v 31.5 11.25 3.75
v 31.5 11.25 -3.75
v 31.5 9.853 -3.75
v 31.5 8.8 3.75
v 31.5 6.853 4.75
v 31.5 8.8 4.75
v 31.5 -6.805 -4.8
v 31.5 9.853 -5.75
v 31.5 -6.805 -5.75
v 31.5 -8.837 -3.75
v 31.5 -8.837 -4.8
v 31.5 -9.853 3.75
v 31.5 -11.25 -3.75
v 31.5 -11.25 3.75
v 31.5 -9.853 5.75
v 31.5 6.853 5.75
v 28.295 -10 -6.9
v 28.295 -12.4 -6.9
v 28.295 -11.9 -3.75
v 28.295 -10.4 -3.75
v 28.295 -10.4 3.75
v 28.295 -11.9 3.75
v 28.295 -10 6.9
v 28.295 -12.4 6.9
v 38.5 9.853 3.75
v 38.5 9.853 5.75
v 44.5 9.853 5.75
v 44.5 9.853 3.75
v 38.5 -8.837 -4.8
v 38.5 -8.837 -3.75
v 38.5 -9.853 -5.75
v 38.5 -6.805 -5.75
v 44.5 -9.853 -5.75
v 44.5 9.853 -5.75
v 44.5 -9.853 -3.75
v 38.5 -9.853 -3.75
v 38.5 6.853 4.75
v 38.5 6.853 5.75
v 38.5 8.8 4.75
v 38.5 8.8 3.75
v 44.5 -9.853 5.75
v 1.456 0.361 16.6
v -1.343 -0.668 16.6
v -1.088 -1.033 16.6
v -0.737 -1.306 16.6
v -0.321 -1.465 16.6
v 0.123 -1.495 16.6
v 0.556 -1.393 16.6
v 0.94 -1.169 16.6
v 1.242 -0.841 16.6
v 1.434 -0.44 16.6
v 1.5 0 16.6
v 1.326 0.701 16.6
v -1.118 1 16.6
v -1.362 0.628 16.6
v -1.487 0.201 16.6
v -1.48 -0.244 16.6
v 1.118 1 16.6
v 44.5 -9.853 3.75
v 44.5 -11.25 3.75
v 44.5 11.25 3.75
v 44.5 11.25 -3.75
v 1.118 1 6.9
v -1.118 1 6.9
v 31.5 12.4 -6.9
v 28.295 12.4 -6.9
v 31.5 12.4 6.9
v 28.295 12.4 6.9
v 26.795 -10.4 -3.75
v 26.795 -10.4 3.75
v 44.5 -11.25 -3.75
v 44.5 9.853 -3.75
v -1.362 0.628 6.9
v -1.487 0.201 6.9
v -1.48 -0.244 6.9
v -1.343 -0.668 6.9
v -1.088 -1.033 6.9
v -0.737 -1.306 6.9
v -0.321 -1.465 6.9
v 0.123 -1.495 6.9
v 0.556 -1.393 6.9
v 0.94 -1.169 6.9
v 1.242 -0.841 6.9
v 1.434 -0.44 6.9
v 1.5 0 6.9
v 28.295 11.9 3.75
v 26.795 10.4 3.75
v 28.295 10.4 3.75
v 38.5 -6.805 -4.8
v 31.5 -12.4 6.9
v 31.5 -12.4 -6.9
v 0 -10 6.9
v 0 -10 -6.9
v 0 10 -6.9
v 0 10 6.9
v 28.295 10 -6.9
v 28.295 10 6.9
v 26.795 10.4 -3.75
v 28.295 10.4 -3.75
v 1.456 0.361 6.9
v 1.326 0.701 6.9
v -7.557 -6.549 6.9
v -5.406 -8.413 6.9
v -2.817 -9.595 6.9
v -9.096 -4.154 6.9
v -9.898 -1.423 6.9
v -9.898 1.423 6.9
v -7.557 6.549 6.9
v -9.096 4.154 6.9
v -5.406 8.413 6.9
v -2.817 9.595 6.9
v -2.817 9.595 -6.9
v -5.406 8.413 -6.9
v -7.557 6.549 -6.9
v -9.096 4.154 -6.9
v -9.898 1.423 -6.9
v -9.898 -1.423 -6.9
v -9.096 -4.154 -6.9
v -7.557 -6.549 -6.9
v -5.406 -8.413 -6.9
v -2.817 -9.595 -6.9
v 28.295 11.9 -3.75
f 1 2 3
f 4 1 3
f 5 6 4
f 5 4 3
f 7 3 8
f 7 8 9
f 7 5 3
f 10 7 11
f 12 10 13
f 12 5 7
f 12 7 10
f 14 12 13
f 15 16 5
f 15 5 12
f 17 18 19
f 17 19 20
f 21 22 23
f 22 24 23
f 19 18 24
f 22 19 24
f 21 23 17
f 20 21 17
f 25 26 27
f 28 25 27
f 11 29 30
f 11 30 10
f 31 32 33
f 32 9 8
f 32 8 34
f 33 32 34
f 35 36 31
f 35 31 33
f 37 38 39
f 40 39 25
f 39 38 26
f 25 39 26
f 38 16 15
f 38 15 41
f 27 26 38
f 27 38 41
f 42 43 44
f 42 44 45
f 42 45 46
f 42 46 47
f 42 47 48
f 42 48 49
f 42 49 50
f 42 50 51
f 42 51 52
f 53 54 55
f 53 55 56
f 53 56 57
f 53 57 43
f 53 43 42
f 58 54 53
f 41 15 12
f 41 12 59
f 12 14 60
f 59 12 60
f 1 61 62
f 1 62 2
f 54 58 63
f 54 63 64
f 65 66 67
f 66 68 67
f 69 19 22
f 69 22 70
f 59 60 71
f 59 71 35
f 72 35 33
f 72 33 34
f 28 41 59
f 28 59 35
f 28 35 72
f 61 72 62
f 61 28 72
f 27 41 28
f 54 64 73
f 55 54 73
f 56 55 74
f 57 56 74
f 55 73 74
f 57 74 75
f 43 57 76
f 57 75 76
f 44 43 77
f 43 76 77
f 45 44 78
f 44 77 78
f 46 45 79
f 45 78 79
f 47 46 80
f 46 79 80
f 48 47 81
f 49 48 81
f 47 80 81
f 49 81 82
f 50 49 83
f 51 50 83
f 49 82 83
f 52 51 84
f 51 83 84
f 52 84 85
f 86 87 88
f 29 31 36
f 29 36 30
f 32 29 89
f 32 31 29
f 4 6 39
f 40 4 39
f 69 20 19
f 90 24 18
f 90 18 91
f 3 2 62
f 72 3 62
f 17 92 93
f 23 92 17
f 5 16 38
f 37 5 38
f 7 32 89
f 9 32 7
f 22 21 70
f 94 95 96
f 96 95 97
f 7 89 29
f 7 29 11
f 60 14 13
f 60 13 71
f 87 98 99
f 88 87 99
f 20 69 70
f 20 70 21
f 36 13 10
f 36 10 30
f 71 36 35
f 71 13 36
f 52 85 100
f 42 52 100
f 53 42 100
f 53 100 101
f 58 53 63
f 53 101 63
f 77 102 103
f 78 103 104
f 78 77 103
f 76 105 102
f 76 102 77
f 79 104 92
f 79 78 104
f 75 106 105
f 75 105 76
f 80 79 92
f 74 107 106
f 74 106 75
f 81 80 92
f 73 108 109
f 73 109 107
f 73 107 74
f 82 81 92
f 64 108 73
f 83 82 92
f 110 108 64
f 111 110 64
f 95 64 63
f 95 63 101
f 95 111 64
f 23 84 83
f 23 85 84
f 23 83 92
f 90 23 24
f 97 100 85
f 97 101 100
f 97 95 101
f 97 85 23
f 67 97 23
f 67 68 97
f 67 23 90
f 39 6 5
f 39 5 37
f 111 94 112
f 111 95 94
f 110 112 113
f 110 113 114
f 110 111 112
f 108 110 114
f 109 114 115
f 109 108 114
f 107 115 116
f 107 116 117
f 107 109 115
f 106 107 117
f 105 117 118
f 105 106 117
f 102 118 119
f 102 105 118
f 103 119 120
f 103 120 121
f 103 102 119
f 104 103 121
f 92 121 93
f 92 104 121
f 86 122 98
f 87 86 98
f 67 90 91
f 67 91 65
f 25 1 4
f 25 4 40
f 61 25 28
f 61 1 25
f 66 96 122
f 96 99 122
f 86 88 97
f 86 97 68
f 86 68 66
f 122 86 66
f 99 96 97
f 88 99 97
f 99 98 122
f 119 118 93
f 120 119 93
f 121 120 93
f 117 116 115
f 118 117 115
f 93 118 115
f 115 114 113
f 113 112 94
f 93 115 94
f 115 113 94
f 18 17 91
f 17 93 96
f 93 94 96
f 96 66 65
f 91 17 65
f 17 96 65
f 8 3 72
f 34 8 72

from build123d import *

# Parameters (mm, degrees)
SKETCH1_R           = 10
SKETCH1_W           = 31.5
SKETCH1_H           = 20
SKETCH1_W_2         = 3.204542896
SKETCH1_H_2         = 24.8
BOSS_EXTRUDE1_DEPTH = 6.9
BOSS_EXTRUDE2_DEPTH = 5.75
BOSS_EXTRUDE3_DEPTH = 9.7
SKETCH3_W           = 13
SKETCH3_H           = 1.999999936
SKETCH3_H_2         = 2.000000064
CUT_EXTRUDE1_DEPTH  = 1.397
SKETCH4_W           = 7.0000114
SKETCH4_H           = 1.016
CUT_EXTRUDE2_DEPTH  = 2.000000064
SKETCH4_3_W         = 7.0000114
SKETCH4_3_H         = 2.032
CUT_EXTRUDE3_DEPTH  = 0.95
SKETCH6_W           = 7
SKETCH6_H           = 1.947
CUT_EXTRUDE4_DEPTH  = 1
SKETCH6_3_W         = 7
SKETCH6_3_H         = 1.053
CUT_EXTRUDE5_DEPTH  = 1.999999936
BOSS_EXTRUDE4_START = -3.75
BOSS_EXTRUDE4_DEPTH = 7.5


with BuildPart() as part:
    # Sketch1 → Boss-Extrude1 (new, symmetric)
    with BuildSketch(Plane.XY):
        Circle(SKETCH1_R)
        with Locations((15.75, 0)):
            Rectangle(SKETCH1_W, SKETCH1_H)
        with Locations((29.897728552, 0)):
            Rectangle(SKETCH1_W_2, SKETCH1_H_2)
    extrude(amount=BOSS_EXTRUDE1_DEPTH, both=True)

    # Sketch2 → Boss-Extrude3 (add)
    with BuildSketch(Plane.XY.offset(6.9)):
        with BuildLine():
            Line((1.118033989, 1), (-1.118033989, 1))
            ThreePointArc((-1.118033989, 1), (-0.535233135, -1.401258538), (1.5, 0))
            ThreePointArc((1.5, 0), (1.401258538, 0.535233135), (1.118033989, 1))
        make_face()
    extrude(amount=BOSS_EXTRUDE3_DEPTH)

    # Sketch8 → Boss-Extrude4 (add)
    with BuildSketch(Plane.XY.offset(BOSS_EXTRUDE4_START)):
        Polygon((26.795457104, 10.4), (28.295457104, 10.4), (28.295457104, 11.9), align=None)
        Polygon((26.795457104, -10.4), (28.295457104, -10.4), (28.295457104, -11.9), align=None)
    extrude(amount=BOSS_EXTRUDE4_DEPTH)


with BuildPart() as body_2:
    # Sketch1<3> → Boss-Extrude2 (new, symmetric)
    with BuildSketch(Plane.XY):
        Polygon((31.5, 11.25), (31.5, 10), (31.5, 0), (44.5, 0), (44.5, 11.25), align=None)
        Polygon((31.5, 0), (31.5, -10), (31.5, -11.25), (44.5, -11.25), (44.5, 0), align=None)
    extrude(amount=BOSS_EXTRUDE2_DEPTH, both=True)

    # Sketch3 → Cut-Extrude1 (cut)
    with BuildSketch(Plane.XZ.offset(11.25)):
        with Locations((38, 4.750000032)):
            Rectangle(SKETCH3_W, SKETCH3_H)
        with Locations((38, -4.749999968)):
            Rectangle(SKETCH3_W, SKETCH3_H_2)
    cut_extrude1 = extrude(amount=-CUT_EXTRUDE1_DEPTH, mode=Mode.SUBTRACT)

    # Mirror1: Cut-Extrude1 across plane
    add(cut_extrude1.mirror(Plane.ZX), mode=Mode.SUBTRACT)

    # Sketch4 → Cut-Extrude2 (cut)
    with BuildSketch(Plane(origin=(0, 0, -5.75), x_dir=(-1, 0, 0), z_dir=(0, 0, -1))):
        with Locations((-35.0000057, -9.345)):
            Rectangle(SKETCH4_W, SKETCH4_H)
    extrude(amount=-CUT_EXTRUDE2_DEPTH, mode=Mode.SUBTRACT)

    # Sketch4<3> → Cut-Extrude3 (cut)
    with BuildSketch(Plane(origin=(0, 0, -5.75), x_dir=(-1, 0, 0), z_dir=(0, 0, -1))):
        with Locations((-35.0000057, -7.821)):
            Rectangle(SKETCH4_3_W, SKETCH4_3_H)
    extrude(amount=-CUT_EXTRUDE3_DEPTH, mode=Mode.SUBTRACT)

    # Sketch6 → Cut-Extrude4 (cut)
    with BuildSketch(Plane.XY.offset(5.75)):
        with Locations((35, 7.8265)):
            Rectangle(SKETCH6_W, SKETCH6_H)
    extrude(amount=-CUT_EXTRUDE4_DEPTH, mode=Mode.SUBTRACT)

    # Sketch6<3> → Cut-Extrude5 (cut)
    with BuildSketch(Plane.XY.offset(5.75)):
        with Locations((35, 9.3265)):
            Rectangle(SKETCH6_3_W, SKETCH6_3_H)
    extrude(amount=-CUT_EXTRUDE5_DEPTH, mode=Mode.SUBTRACT)


solid = Compound([part.part, body_2.part])
